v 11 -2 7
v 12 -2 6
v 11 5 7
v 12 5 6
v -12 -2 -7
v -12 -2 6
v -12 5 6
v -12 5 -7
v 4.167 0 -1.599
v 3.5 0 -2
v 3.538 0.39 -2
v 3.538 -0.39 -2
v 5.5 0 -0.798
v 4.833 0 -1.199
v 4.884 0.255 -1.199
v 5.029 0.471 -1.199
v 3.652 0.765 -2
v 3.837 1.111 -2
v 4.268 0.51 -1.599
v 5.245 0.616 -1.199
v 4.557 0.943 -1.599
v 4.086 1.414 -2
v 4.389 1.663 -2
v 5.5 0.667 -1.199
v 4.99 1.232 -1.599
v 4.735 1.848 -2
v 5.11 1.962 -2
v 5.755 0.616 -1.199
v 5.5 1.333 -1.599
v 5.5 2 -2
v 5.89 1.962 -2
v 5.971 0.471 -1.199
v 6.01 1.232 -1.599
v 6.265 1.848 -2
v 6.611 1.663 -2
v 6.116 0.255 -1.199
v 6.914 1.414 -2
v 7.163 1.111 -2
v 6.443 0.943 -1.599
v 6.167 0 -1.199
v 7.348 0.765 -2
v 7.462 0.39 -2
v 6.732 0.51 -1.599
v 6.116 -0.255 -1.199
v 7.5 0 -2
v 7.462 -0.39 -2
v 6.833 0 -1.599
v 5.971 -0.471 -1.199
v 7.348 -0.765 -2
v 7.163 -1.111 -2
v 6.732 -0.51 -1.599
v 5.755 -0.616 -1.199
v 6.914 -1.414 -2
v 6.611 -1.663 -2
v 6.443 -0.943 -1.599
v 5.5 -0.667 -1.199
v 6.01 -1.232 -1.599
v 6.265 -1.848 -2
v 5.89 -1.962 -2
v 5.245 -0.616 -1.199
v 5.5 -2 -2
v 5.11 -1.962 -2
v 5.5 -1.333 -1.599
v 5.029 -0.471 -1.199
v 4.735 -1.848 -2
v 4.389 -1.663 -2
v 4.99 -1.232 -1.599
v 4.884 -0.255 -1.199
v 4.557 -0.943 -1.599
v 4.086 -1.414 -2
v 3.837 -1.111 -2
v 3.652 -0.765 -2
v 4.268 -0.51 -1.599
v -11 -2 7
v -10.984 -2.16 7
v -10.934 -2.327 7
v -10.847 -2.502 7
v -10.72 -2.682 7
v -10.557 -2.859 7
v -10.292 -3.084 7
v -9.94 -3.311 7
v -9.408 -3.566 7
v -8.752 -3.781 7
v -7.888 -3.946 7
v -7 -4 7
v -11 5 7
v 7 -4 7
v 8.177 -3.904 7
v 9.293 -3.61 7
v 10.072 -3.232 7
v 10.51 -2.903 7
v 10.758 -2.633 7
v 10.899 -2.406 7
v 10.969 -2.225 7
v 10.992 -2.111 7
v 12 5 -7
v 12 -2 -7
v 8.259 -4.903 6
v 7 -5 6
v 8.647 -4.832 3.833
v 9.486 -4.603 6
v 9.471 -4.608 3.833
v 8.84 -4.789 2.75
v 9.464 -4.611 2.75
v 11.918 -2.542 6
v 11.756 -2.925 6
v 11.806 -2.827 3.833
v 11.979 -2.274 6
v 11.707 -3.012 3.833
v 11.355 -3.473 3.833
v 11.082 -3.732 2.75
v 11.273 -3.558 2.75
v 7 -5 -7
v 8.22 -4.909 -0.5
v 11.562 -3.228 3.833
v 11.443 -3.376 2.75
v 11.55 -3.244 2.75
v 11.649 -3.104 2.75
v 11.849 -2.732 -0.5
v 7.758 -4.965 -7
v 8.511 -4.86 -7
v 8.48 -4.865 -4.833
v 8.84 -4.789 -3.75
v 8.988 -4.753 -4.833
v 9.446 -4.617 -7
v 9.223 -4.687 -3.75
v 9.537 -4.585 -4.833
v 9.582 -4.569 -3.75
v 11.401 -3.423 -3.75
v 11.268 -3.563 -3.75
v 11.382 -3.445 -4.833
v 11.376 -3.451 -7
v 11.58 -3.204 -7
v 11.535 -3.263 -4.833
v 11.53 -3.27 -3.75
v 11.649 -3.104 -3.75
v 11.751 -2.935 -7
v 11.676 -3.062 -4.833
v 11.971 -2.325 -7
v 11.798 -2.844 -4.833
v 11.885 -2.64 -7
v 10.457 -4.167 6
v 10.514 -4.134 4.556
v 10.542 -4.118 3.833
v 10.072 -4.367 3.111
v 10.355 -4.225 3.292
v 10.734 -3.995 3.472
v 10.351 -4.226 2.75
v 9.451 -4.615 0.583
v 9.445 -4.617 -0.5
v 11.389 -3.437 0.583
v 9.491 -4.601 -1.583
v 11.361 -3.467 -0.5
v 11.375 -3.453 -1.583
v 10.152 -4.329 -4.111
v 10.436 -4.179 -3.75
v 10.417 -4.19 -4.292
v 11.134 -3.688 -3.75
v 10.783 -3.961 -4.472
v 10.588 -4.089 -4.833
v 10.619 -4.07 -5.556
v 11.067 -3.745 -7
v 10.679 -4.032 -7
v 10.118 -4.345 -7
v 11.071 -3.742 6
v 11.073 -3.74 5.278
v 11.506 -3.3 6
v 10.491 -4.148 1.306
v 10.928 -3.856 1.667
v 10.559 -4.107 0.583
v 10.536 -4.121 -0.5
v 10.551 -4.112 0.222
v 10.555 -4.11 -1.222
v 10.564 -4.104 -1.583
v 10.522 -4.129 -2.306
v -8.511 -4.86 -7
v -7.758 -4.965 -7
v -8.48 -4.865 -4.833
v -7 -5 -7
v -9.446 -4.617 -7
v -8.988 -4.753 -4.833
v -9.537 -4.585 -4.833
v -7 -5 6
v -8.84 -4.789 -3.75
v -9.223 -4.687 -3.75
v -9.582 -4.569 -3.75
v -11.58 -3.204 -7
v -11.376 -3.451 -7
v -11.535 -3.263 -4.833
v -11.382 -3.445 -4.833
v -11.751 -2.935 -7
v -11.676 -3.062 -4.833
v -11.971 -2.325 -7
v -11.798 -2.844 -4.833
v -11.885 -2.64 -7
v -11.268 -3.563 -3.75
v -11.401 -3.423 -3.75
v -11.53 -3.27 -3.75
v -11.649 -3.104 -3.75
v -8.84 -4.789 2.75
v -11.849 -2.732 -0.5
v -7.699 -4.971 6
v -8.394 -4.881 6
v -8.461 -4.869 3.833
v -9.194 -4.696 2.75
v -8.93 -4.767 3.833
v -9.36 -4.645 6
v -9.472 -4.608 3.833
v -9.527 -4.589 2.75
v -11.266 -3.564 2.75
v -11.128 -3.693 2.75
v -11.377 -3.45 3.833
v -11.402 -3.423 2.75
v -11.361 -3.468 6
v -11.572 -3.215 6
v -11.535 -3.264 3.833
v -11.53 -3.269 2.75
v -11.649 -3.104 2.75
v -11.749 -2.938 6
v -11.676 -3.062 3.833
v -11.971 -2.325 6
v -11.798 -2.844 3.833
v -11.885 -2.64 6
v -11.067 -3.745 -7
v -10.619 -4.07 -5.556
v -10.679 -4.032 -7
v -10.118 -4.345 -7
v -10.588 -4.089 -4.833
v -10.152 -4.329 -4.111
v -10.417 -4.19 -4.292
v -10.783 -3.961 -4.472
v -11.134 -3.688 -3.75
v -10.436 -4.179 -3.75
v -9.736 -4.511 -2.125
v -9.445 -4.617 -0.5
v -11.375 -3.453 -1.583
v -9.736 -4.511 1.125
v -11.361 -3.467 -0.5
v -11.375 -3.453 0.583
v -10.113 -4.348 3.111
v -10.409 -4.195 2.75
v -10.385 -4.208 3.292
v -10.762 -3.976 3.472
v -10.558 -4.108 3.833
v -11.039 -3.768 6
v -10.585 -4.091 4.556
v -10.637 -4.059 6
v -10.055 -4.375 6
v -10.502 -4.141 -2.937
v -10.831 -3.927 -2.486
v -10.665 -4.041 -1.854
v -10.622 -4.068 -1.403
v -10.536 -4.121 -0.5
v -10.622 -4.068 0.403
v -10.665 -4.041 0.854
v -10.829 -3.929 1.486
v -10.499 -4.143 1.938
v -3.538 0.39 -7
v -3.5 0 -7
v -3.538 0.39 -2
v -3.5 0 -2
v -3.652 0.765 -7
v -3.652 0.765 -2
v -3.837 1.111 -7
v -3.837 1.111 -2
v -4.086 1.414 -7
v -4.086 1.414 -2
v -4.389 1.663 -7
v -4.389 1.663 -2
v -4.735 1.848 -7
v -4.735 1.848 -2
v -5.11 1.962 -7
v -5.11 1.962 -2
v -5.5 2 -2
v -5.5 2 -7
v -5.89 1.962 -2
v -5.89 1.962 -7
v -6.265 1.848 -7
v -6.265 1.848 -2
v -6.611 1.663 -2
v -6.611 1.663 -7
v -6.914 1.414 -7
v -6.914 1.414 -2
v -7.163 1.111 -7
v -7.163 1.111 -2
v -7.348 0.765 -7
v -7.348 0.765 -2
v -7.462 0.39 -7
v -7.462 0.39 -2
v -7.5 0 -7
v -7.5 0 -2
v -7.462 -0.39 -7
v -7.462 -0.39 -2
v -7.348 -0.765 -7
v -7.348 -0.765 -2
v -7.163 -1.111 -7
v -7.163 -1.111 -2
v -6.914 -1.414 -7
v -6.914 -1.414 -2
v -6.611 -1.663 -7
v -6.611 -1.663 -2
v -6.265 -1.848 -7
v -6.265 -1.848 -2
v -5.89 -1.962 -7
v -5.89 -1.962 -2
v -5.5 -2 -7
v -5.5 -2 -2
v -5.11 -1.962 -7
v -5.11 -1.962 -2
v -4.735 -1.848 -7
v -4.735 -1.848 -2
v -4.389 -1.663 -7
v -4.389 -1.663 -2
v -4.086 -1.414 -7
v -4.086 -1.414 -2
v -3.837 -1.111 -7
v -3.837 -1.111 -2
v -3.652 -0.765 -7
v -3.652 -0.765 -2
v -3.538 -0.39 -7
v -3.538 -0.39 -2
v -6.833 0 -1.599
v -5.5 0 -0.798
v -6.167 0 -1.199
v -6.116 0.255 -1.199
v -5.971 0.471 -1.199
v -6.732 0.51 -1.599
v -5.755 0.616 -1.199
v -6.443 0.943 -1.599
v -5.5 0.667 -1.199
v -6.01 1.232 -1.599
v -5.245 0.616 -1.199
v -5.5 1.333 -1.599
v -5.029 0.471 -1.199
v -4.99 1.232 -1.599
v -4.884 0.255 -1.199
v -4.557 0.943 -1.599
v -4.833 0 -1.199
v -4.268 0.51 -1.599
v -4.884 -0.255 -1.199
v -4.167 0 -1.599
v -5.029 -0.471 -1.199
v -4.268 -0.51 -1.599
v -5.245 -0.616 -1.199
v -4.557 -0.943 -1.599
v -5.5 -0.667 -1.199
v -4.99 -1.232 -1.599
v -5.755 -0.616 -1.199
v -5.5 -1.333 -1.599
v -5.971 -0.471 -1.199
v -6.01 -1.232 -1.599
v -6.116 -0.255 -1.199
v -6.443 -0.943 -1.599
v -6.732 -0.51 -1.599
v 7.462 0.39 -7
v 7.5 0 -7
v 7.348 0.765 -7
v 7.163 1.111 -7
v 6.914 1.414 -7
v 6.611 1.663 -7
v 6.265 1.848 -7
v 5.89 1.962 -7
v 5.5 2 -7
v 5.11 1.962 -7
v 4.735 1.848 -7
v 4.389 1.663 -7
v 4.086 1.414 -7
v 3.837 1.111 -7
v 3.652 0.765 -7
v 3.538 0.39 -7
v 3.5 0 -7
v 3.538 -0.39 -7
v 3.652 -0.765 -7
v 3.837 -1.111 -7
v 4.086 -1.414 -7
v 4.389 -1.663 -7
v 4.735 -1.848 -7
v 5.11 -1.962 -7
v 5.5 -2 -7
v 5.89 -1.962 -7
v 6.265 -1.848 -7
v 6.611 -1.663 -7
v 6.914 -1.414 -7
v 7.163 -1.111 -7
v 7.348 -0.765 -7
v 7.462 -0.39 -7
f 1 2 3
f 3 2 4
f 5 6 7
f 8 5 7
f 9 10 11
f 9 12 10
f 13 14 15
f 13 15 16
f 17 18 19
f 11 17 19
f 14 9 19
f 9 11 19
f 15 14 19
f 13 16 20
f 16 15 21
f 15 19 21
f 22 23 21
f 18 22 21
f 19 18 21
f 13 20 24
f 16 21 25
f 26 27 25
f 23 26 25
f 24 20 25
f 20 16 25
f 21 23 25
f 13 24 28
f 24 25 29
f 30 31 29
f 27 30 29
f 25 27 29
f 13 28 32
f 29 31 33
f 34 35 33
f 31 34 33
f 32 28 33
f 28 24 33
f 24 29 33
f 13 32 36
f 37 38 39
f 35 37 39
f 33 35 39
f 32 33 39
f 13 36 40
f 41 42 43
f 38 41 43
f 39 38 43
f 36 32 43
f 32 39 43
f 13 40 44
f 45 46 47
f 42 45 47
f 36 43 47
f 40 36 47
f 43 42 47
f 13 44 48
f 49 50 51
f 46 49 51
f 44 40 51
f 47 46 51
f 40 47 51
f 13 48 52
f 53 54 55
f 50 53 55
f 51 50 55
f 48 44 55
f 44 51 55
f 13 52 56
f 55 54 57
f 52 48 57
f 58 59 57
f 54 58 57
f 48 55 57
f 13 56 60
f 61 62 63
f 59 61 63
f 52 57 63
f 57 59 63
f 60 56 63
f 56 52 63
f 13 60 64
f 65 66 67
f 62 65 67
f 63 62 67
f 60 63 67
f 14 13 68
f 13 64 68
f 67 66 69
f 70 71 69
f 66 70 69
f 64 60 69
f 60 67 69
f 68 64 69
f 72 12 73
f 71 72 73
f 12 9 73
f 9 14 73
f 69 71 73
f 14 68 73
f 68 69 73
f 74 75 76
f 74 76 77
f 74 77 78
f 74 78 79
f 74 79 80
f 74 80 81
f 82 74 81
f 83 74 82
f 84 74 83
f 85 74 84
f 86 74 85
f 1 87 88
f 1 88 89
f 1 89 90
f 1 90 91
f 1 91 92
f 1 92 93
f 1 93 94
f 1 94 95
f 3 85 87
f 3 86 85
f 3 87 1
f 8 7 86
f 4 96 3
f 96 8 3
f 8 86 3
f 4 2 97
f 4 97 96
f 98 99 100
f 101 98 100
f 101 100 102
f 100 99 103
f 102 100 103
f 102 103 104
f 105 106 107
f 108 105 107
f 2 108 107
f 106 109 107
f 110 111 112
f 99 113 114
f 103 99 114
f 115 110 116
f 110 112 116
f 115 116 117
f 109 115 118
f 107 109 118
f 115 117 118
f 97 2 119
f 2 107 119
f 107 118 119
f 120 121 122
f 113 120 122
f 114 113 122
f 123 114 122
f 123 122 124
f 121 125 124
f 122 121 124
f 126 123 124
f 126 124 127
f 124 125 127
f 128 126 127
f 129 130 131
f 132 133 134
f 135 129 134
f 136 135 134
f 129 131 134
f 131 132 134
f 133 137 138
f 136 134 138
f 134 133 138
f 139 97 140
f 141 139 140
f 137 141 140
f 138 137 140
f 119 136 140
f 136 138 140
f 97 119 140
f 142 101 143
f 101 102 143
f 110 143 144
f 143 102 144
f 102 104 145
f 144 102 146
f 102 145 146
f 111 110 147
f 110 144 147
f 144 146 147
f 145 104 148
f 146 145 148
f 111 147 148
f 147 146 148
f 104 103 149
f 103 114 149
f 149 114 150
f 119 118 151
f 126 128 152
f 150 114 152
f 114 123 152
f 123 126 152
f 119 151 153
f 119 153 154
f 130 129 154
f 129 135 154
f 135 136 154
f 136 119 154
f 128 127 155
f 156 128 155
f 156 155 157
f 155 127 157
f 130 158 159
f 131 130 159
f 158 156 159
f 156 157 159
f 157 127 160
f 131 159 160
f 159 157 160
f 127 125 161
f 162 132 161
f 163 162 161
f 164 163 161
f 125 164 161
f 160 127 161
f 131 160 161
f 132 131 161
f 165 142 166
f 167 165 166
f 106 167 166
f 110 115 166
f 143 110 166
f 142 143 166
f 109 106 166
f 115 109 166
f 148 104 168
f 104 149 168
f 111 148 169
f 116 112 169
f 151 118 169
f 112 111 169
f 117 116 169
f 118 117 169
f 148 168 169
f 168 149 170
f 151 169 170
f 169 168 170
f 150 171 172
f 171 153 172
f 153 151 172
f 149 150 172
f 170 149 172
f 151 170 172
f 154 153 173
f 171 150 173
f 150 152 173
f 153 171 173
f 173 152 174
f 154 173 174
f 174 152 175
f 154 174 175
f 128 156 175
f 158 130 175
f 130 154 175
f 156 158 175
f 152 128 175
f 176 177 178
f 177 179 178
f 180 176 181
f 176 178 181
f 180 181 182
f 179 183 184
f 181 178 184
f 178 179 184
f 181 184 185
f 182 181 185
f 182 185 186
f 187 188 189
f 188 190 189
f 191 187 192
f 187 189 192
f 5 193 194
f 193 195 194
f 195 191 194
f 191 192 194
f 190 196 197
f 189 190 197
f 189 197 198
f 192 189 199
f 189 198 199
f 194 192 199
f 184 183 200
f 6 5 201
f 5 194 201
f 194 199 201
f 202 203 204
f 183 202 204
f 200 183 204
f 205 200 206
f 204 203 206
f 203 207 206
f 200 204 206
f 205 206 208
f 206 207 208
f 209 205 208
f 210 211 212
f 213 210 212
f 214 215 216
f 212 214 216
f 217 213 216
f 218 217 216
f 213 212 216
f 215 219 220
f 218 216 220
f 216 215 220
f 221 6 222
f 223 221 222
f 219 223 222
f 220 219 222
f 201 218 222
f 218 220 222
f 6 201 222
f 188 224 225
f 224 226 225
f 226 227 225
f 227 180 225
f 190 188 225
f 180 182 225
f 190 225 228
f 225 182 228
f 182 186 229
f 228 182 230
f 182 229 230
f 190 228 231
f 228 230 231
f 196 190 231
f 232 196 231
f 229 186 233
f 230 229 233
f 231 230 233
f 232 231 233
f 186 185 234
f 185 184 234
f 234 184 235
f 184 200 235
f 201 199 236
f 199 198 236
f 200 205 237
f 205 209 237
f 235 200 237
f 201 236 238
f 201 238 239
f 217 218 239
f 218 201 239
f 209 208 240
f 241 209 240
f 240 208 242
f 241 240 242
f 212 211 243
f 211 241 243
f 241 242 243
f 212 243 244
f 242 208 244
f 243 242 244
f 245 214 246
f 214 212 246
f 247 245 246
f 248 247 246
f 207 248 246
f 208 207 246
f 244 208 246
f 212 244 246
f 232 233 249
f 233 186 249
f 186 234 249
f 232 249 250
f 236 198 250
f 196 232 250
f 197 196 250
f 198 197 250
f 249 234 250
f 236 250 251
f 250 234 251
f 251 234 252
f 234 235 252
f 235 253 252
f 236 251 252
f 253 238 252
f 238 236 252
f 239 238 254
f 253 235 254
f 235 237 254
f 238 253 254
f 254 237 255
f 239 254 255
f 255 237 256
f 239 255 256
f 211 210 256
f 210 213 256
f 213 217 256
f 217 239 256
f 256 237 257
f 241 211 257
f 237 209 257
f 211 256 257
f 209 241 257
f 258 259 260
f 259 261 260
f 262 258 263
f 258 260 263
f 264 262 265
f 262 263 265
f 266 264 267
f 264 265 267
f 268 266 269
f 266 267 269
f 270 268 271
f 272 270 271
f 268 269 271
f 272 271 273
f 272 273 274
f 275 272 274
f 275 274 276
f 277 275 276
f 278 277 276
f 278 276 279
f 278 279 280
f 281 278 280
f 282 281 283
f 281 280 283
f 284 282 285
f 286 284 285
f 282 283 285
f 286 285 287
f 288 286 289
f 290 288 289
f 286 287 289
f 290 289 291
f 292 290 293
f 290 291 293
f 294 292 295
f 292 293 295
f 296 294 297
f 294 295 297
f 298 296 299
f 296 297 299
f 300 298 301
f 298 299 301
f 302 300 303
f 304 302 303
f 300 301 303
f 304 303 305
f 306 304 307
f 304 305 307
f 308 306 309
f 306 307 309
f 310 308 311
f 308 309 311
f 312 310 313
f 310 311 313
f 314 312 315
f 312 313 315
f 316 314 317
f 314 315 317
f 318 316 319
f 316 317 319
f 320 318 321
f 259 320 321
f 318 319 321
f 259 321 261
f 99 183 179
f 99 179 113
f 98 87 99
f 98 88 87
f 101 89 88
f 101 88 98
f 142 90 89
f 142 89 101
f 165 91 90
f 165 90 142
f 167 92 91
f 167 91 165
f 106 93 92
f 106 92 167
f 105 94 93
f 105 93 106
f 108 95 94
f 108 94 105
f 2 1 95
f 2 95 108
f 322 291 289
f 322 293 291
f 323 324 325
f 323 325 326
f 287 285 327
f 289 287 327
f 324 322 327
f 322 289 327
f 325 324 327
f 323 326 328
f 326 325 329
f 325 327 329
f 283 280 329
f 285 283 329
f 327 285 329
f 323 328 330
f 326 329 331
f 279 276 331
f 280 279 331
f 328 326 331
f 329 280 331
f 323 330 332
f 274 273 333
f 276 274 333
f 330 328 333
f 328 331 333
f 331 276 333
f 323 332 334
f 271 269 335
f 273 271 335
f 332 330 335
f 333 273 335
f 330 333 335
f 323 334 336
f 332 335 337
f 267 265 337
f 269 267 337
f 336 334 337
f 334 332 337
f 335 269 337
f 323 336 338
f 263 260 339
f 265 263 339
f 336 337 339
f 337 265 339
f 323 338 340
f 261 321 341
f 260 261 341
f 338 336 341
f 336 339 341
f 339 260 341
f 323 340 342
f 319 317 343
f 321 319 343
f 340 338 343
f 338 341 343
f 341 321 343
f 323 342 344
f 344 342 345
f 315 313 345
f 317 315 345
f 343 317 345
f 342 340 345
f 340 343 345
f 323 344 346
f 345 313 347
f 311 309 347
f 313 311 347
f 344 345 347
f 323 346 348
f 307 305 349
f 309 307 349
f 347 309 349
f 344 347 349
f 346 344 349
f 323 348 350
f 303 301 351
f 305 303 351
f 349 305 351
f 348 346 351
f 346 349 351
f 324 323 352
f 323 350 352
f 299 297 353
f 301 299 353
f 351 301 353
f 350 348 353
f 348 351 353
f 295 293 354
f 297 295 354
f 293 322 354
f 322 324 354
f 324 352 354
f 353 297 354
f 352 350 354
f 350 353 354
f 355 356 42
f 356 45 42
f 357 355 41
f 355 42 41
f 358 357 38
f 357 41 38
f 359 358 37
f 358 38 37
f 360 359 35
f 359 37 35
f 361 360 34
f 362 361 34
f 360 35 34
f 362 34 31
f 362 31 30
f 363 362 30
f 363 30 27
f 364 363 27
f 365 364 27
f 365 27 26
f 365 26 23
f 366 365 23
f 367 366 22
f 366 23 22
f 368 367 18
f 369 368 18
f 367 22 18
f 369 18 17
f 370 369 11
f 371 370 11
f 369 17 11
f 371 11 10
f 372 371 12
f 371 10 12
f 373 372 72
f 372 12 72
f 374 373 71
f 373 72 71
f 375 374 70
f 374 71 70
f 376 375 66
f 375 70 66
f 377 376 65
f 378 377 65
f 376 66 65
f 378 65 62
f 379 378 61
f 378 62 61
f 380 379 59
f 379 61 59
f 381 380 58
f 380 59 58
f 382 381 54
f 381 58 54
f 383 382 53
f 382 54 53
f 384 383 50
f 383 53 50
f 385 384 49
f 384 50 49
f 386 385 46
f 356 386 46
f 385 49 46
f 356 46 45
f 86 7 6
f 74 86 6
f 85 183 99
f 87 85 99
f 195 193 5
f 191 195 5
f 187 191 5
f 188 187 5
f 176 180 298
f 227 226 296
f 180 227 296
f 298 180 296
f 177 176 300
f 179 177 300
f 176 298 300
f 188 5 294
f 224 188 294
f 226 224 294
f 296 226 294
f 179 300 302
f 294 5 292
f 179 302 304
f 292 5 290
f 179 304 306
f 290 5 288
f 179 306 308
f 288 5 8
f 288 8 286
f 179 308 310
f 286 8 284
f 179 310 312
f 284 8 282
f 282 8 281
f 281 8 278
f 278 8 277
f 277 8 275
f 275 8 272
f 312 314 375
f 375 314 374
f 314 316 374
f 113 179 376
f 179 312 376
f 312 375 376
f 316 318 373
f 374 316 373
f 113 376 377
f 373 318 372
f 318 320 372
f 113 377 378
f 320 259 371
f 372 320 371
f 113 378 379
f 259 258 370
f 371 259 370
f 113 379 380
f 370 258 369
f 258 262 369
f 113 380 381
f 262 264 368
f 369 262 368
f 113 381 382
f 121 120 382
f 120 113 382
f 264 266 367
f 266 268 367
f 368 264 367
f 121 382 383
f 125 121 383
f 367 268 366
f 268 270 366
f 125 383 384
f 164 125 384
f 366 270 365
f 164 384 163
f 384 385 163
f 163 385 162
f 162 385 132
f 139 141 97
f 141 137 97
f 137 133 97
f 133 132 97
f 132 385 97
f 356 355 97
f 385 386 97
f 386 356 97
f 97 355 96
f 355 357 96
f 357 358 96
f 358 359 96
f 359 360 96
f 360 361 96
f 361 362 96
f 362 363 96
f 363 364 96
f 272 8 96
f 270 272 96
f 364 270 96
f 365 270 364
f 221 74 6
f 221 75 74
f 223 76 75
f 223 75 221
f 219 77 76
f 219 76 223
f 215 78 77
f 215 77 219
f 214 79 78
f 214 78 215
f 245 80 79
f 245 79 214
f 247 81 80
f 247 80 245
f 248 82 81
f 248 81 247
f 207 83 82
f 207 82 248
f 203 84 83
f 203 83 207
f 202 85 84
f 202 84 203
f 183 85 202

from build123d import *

# Parameters (mm, degrees)
SKIZZE1_W                          = 24
SKIZZE1_H                          = 10
AUFSATZ_LINEAR_AUSTRAGEN1_DEPTH    = 7
F_4_0_4_DURCHMESSER_BOHRUNG1_D     = 4
F_4_0_4_DURCHMESSER_BOHRUNG1_DEPTH = 5
F_4_0_4_DURCHMESSER_BOHRUNG1_TIP   = 1.201721238
VERRUNDUNG1_SIZE                   = 5
VERRUNDUNG1_SIZE_2                 = 3
FASE2_SIZE                         = 1


with BuildPart() as part:
    # Skizze1 → Aufsatz-Linear austragen1 (new, symmetric)
    with BuildSketch(Plane.XY):
        Rectangle(SKIZZE1_W, SKIZZE1_H)
    extrude(amount=AUFSATZ_LINEAR_AUSTRAGEN1_DEPTH, both=True)

    # Ø4.0 (4) Durchmesser Bohrung1
    with Locations(Plane(origin=(0, 0, -7), x_dir=(-1, 0, 0), z_dir=(0, 0, -1))):
        with Locations((-5.5, 0), (5.5, 0)):
            Hole(F_4_0_4_DURCHMESSER_BOHRUNG1_D / 2, depth=F_4_0_4_DURCHMESSER_BOHRUNG1_DEPTH)
            with Locations((0, 0, -(F_4_0_4_DURCHMESSER_BOHRUNG1_DEPTH + F_4_0_4_DURCHMESSER_BOHRUNG1_TIP / 2))):  # 118° drill point
                Cone(0, F_4_0_4_DURCHMESSER_BOHRUNG1_D / 2, F_4_0_4_DURCHMESSER_BOHRUNG1_TIP, mode=Mode.SUBTRACT)

    # Verrundung1
    # an asymmetric fillet: 5, 3 mm, written as the material it takes off along each edge
    with BuildSketch(Plane(origin=(12, -5, -19.5), x_dir=(-1, 0, 0), z_dir=(0, 0, 1)), Plane(origin=(-12, -5, 19.5), x_dir=(1, 0, 0), z_dir=(0, 0, -1))) as verrundung1_piece_1:
        with BuildLine():
            Bezier((VERRUNDUNG1_SIZE, 0), (0, 0), (0, -VERRUNDUNG1_SIZE_2), weights=[1, 0.707106781, 1])
            Line((0, -VERRUNDUNG1_SIZE_2), (0, 0))
            Line((0, 0), (VERRUNDUNG1_SIZE, 0))
        make_face()
    extrude(amount=39, mode=Mode.SUBTRACT)

    # Fase2
    fase2_edges = [part.edges().sort_by_distance(p)[0] for p in [
        (12, 1.5, 7),
        (10.099176713, -4.354195674, 7),
        (0, -5, 7),
        (-10.099176713, -4.354195674, 7),
        (-12, 1.5, 7),
    ]]
    chamfer(fase2_edges, length=FASE2_SIZE)


solid = part.part
